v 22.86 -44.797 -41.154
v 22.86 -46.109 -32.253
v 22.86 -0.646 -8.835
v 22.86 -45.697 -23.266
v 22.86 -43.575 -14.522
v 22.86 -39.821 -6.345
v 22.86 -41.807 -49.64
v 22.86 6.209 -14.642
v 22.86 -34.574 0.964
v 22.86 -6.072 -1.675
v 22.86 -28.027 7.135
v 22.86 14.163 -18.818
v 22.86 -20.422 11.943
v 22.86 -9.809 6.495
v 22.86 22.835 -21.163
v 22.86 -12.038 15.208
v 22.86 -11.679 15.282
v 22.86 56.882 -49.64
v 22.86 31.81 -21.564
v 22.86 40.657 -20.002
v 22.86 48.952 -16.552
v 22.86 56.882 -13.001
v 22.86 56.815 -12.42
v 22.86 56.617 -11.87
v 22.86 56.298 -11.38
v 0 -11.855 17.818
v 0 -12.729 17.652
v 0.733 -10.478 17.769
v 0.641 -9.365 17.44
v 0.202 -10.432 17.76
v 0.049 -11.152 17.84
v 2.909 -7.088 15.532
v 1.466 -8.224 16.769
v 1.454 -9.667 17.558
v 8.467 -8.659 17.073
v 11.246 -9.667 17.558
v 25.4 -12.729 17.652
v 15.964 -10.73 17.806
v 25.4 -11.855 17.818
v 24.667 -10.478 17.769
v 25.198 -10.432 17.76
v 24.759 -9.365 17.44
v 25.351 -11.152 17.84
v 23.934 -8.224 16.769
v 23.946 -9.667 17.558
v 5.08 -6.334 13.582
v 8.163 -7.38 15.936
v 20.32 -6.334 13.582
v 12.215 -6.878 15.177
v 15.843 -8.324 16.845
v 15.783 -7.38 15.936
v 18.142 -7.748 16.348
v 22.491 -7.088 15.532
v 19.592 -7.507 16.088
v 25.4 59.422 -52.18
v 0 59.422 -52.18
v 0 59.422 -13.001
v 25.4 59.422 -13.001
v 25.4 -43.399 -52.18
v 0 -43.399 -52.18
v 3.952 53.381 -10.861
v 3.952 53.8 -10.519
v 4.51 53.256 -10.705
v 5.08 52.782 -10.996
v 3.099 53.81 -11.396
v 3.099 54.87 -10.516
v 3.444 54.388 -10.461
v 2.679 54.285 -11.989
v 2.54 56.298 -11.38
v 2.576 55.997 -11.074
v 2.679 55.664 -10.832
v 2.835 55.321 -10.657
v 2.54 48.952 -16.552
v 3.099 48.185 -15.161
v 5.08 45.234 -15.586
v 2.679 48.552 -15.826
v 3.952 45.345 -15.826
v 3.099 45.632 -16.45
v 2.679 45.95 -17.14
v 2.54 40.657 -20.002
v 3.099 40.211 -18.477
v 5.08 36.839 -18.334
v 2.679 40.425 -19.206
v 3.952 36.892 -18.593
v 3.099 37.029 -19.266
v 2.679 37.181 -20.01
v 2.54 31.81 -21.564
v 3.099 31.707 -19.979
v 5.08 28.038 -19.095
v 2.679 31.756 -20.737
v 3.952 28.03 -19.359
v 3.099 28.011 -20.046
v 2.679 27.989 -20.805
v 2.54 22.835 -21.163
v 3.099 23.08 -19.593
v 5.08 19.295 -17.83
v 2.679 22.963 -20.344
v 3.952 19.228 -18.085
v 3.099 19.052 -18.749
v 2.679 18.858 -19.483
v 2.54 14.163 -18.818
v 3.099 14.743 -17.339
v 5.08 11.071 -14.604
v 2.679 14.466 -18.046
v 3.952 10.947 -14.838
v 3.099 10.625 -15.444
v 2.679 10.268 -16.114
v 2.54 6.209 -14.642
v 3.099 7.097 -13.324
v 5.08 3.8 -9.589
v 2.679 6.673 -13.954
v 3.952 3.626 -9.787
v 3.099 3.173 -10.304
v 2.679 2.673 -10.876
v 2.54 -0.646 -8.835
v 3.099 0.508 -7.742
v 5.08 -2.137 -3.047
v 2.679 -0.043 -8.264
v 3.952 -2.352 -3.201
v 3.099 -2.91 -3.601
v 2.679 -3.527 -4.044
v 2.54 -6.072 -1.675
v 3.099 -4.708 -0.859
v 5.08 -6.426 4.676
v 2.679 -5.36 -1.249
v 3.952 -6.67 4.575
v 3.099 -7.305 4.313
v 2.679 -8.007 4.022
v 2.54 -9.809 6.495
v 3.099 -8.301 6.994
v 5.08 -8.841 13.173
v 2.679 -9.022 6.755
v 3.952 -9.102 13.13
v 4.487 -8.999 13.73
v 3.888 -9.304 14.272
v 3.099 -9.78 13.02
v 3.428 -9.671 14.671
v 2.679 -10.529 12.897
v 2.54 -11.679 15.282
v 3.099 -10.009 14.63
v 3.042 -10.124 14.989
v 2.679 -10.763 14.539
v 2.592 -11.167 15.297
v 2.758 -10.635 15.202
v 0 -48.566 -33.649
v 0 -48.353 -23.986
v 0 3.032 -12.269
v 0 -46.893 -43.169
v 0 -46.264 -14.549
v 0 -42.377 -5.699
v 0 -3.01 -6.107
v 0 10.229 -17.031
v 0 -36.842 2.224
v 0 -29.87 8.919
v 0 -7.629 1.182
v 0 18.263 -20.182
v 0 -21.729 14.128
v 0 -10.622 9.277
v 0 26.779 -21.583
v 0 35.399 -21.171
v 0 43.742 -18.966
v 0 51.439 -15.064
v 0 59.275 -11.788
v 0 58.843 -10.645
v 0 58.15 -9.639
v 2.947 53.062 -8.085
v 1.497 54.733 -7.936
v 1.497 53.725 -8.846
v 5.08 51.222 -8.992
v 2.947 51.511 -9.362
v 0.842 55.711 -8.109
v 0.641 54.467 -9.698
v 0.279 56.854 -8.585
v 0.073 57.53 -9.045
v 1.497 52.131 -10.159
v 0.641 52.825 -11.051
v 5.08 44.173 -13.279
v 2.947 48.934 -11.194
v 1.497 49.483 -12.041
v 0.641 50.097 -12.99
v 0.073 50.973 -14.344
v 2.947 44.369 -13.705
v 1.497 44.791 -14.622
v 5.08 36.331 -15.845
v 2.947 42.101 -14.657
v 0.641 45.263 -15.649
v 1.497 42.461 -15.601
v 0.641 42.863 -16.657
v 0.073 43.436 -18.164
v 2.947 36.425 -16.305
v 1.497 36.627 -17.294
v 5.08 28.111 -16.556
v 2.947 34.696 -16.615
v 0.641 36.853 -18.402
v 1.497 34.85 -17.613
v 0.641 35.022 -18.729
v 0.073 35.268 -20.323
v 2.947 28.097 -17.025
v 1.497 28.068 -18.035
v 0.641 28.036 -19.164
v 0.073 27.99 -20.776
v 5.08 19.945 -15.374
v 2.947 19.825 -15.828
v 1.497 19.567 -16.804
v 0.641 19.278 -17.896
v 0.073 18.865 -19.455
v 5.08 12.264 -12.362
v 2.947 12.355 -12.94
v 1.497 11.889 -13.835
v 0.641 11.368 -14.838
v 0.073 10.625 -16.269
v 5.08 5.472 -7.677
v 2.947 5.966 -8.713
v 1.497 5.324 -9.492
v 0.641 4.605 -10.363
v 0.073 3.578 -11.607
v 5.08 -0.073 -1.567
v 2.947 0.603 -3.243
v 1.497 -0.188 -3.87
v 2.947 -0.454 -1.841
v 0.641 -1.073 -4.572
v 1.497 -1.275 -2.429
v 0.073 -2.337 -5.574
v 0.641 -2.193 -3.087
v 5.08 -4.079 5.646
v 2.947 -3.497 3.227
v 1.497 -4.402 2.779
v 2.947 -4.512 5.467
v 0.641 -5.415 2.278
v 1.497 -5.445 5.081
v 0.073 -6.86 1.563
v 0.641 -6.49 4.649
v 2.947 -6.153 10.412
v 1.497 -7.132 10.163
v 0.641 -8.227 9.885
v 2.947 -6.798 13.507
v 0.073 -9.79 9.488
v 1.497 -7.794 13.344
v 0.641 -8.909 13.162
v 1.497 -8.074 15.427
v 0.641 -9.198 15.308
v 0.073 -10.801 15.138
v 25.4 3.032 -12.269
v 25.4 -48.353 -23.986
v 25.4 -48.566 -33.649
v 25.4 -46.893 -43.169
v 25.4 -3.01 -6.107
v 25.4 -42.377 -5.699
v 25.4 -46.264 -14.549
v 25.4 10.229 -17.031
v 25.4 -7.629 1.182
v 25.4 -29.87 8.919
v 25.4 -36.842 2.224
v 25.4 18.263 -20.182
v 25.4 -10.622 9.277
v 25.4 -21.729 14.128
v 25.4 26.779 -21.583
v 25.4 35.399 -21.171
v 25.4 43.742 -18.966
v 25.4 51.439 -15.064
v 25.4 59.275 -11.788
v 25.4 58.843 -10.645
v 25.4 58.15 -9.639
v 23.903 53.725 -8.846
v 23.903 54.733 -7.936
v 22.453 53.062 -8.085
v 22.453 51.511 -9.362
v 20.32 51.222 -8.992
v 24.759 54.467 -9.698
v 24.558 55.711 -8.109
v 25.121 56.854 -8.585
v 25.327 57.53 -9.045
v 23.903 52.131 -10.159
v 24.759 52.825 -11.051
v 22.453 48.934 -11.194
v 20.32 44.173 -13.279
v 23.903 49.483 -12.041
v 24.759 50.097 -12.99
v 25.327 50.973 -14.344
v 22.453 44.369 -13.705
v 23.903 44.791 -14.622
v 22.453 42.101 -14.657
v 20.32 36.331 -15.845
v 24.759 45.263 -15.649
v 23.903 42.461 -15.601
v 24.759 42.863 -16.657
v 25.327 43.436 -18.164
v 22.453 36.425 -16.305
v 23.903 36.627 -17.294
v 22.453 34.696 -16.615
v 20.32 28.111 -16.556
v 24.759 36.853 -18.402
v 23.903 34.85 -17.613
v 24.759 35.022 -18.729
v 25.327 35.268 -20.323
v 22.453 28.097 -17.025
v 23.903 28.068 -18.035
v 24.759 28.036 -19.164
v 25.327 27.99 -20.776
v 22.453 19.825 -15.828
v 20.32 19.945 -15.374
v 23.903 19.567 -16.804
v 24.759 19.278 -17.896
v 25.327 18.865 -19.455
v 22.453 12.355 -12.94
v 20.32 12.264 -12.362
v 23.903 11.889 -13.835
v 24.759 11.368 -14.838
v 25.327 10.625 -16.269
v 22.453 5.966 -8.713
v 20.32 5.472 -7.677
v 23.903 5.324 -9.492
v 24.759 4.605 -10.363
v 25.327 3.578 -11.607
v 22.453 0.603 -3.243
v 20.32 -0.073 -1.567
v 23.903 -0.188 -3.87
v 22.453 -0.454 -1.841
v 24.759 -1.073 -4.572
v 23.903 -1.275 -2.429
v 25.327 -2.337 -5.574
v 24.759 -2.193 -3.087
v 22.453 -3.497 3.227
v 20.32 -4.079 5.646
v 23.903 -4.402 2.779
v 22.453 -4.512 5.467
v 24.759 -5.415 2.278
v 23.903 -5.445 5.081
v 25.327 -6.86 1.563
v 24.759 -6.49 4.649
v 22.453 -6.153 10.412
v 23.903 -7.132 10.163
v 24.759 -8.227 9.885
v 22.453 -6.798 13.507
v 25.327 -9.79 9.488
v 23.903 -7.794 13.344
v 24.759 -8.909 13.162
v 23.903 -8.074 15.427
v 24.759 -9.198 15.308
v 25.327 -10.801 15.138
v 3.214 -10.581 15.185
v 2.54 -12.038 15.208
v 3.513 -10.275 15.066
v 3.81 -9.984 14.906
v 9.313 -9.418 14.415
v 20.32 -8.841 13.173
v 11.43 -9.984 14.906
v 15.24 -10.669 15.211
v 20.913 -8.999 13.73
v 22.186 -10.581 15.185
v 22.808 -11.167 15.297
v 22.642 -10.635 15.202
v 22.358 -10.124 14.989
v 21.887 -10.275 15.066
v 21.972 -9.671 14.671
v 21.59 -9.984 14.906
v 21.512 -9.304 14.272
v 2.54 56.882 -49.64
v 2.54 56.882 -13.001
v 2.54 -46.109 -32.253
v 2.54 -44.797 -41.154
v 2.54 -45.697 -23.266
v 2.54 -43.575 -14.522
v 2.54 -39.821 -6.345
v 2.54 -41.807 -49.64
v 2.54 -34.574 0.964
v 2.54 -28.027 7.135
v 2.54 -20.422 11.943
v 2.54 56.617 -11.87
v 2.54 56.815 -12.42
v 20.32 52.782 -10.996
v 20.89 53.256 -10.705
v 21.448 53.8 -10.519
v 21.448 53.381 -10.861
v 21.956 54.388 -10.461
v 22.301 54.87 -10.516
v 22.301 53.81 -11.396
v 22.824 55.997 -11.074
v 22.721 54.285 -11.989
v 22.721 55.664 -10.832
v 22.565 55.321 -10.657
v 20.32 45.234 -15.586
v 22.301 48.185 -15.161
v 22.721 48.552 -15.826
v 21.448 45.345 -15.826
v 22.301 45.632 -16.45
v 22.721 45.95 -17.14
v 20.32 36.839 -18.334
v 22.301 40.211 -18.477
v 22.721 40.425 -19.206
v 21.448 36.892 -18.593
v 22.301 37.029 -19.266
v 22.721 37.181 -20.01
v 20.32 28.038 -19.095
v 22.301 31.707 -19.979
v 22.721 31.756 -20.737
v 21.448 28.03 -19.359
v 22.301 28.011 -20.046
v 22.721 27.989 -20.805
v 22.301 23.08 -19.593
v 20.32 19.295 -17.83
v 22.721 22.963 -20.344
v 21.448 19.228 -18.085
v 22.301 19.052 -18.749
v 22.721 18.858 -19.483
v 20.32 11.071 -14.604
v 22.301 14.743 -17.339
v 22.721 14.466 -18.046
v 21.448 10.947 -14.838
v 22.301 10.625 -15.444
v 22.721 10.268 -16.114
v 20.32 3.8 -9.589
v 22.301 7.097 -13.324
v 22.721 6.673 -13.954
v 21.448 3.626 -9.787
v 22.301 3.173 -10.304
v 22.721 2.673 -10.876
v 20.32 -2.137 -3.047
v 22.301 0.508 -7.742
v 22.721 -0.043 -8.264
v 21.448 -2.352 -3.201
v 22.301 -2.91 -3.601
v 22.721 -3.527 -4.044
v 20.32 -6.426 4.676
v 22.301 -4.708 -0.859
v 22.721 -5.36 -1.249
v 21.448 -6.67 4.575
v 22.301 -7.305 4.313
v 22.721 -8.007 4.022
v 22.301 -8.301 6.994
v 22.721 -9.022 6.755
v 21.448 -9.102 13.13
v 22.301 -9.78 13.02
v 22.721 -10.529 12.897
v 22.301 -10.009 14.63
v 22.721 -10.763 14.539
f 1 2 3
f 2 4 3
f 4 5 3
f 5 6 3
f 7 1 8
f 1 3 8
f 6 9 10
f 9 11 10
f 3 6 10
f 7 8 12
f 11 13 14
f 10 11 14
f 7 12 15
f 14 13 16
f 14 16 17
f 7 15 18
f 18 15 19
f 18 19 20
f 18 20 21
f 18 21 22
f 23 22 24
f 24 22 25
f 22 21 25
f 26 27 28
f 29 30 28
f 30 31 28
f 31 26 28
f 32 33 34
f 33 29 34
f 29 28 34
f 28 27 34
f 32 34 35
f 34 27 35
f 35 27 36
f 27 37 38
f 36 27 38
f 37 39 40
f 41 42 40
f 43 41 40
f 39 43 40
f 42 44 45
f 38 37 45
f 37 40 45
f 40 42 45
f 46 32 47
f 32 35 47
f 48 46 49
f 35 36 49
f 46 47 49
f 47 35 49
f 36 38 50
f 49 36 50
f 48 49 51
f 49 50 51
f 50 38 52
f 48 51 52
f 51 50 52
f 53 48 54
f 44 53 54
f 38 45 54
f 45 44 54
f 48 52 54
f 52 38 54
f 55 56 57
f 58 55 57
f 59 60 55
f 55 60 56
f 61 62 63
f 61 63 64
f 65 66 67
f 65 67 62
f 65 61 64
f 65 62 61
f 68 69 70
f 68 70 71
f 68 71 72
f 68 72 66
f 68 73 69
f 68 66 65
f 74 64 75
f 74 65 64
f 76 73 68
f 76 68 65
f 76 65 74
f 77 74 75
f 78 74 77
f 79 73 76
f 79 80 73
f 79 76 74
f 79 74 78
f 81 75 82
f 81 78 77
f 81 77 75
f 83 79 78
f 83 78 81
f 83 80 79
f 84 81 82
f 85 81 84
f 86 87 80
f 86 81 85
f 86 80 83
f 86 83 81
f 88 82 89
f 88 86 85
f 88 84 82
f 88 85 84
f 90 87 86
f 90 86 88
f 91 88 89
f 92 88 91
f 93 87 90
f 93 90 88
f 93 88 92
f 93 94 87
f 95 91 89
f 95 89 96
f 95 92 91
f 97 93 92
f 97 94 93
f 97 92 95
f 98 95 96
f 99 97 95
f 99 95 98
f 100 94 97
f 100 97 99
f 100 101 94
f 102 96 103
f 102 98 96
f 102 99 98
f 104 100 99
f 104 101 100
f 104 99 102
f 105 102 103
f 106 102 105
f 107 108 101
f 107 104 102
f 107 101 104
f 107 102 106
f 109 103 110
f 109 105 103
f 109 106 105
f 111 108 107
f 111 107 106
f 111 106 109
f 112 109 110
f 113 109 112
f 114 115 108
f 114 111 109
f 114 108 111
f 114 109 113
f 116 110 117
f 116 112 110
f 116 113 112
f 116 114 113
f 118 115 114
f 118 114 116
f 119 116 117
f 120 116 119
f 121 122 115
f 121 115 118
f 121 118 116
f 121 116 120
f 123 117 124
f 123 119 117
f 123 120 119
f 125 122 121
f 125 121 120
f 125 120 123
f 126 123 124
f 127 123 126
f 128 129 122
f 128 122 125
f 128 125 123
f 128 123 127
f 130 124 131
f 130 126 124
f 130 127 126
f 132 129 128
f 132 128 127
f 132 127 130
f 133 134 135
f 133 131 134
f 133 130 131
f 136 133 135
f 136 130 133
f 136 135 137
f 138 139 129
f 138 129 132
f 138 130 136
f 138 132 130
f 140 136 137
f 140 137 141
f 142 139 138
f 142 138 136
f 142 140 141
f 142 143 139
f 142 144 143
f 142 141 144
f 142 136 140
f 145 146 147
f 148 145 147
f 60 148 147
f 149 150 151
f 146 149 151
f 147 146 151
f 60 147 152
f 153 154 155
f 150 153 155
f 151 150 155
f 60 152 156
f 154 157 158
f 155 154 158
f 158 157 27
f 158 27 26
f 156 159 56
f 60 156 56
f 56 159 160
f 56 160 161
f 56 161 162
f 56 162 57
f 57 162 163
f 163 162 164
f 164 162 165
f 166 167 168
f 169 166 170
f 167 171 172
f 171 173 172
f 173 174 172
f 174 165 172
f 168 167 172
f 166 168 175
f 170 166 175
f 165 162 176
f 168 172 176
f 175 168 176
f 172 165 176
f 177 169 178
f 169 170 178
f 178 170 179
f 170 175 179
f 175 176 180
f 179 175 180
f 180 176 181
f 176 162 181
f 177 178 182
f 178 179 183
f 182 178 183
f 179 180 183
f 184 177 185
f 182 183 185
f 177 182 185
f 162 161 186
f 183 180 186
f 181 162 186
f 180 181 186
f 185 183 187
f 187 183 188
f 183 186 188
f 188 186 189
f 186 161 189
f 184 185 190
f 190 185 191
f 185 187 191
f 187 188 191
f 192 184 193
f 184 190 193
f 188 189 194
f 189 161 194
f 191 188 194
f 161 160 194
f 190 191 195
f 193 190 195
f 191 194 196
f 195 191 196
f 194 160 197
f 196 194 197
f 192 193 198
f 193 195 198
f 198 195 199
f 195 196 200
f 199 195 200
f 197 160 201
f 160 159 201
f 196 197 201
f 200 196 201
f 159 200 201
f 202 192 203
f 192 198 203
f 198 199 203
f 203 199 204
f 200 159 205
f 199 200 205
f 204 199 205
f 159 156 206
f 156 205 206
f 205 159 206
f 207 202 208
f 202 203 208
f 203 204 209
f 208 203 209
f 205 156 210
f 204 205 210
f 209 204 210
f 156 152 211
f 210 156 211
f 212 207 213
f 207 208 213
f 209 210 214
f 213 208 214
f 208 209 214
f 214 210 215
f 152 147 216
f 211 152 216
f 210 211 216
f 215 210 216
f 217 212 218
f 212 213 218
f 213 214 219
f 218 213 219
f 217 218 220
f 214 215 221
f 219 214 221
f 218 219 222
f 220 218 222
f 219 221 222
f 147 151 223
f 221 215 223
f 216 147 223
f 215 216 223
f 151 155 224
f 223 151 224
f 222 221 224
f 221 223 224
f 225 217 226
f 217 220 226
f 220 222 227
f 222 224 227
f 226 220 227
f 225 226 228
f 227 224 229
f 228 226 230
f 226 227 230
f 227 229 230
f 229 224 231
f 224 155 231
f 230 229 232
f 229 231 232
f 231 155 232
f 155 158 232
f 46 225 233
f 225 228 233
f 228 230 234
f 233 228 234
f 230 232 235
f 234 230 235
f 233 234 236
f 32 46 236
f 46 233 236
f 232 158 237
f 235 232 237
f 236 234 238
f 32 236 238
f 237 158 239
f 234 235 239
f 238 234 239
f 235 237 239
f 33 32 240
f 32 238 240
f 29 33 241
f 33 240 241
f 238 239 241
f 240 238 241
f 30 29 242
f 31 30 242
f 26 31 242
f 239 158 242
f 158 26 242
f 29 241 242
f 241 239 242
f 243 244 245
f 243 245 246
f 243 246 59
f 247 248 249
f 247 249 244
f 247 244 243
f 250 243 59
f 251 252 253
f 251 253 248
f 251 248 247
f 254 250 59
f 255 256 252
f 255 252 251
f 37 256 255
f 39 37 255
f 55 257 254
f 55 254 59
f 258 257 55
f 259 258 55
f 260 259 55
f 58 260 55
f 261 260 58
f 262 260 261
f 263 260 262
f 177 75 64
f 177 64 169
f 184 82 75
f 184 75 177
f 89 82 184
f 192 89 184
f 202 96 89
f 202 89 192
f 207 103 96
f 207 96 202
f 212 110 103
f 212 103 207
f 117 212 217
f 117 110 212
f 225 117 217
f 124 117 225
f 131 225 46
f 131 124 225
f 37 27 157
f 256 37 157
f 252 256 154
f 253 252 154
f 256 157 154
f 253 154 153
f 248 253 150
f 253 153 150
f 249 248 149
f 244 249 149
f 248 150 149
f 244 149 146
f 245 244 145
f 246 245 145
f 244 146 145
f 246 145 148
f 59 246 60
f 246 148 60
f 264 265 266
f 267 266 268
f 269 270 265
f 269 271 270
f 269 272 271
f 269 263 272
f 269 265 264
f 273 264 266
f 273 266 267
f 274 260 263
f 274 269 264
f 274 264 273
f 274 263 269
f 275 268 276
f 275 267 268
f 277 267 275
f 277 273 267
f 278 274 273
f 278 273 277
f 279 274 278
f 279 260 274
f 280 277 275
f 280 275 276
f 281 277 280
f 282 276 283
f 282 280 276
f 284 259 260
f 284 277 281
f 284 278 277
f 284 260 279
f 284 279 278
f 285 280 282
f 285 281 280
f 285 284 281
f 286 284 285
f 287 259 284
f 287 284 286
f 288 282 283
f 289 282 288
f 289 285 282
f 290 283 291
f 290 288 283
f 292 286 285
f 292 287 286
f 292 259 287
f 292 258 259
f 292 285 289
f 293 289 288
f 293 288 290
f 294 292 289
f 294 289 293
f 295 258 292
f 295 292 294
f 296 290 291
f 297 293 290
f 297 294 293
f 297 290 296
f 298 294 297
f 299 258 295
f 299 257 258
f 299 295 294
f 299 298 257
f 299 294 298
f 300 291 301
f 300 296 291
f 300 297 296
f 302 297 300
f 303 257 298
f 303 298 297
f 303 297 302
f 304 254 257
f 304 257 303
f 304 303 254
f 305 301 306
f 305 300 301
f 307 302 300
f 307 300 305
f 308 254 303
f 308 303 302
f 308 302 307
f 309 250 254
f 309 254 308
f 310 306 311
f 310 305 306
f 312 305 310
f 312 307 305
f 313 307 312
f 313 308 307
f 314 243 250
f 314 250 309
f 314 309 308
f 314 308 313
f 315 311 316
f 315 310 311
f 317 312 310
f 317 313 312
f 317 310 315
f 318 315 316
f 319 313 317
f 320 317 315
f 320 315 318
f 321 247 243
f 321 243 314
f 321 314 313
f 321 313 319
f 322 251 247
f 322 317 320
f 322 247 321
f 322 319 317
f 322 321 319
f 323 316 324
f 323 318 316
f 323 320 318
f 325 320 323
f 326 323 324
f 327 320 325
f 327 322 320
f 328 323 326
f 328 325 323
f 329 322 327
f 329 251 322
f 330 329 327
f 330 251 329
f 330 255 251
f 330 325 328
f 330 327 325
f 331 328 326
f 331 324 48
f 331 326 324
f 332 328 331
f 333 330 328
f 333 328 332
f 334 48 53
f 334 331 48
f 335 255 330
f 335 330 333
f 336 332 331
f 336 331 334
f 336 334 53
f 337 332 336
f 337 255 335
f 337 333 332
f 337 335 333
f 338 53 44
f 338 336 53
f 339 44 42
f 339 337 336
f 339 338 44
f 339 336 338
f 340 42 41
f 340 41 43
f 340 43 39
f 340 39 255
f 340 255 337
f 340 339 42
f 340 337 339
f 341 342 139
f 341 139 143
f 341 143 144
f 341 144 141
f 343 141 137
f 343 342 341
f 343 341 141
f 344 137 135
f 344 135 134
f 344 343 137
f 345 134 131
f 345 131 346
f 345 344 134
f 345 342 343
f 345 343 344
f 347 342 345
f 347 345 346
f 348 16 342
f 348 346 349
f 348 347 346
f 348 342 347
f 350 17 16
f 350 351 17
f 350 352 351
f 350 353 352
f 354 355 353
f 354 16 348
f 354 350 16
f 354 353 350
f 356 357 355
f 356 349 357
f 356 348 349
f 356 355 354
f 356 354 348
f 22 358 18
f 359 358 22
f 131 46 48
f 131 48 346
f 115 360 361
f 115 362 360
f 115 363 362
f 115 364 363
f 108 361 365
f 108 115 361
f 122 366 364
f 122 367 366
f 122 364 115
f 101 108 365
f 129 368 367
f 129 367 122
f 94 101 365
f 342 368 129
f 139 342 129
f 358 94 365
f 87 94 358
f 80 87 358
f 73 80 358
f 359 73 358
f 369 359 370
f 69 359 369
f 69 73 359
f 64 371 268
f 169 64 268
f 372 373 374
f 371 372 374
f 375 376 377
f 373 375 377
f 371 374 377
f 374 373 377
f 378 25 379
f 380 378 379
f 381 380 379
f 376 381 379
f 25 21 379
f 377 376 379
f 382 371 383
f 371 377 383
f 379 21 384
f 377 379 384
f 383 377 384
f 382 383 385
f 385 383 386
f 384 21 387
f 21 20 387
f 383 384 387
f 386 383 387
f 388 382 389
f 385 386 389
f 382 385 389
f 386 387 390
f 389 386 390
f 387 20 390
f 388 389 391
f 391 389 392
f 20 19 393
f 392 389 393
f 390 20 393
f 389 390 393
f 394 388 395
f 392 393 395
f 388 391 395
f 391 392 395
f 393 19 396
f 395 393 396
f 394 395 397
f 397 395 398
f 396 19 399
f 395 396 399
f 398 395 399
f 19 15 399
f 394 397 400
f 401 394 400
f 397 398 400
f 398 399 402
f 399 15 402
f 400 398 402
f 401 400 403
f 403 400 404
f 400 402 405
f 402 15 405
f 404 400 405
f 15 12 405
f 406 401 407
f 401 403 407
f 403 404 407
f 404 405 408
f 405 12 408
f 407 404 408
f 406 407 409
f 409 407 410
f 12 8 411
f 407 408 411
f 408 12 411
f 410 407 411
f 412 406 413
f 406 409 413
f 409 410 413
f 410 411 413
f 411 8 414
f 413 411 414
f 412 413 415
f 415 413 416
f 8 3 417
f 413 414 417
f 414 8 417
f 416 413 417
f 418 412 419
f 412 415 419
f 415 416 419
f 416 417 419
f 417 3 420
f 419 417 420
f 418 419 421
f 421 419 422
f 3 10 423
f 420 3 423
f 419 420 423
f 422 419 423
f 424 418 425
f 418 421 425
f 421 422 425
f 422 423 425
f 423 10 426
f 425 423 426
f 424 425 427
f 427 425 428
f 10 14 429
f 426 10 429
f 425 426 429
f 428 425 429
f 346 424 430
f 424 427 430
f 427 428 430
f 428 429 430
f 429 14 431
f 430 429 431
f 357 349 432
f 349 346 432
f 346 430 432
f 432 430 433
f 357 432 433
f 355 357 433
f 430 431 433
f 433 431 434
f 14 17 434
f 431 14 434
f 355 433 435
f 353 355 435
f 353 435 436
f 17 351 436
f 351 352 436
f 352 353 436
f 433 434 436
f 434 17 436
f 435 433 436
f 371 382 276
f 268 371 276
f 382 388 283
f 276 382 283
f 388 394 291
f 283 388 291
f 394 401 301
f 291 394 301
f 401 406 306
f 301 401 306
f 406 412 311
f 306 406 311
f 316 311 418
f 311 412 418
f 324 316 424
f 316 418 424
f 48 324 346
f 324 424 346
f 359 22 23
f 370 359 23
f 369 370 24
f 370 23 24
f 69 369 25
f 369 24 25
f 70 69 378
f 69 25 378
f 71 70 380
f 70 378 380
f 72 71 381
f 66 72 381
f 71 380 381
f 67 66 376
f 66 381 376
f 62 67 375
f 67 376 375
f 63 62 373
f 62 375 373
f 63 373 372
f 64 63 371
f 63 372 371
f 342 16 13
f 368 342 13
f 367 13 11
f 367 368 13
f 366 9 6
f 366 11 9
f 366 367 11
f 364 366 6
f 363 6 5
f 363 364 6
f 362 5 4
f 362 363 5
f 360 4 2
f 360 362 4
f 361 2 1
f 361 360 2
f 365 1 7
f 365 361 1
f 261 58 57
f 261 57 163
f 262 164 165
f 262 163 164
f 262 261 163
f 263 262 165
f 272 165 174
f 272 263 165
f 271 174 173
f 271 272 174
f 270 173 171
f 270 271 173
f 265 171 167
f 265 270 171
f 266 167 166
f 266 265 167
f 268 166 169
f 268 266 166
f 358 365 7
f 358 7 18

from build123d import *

# Parameters (mm, degrees)
F1_DEPTH = 25.4
F2_R     = 5.08
F3_T     = 2.54


# Not quite as in the source:
# - a shell that OpenCascade refuses in one call is made with other operations: the cavity is built on its own and cut out


with BuildPart() as f1:
    # F0 (on Right) → F1 (new body)
    with BuildSketch(Plane.YZ):
        with BuildLine():
            ThreePointArc((-6.8017239682, 18.9395658672), (-43.2327193048, -7.2897973695), (-43.3986243496, -52.1804355085))
            Line((-43.3986243496, -52.1804355085), (59.4223327935, -52.1804355085))
            Line((59.4223327935, -52.1804355085), (59.4223327935, 0))
            ThreePointArc((59.4223327935, 0), (19.2591298188, -15.1853432617), (-6.8017239682, 18.9395658672))
        make_face()
    extrude(amount=F1_DEPTH)

    # F2
    f2_edges = [f1.edges().sort_by_distance(p)[0] for p in [
        (12.7, 59.422333, 0),
        (12.7, -6.801724, 18.939566),
        (0, 19.25913, -15.185343),
        (25.4, 19.25913, -15.185343),
    ]]
    fillet(f2_edges, radius=F2_R)

    # F3: shell of thickness 2.54, made by hand


with BuildPart() as f3_core1:
    # F3_t2: copy of F1
    add(f1.part)

    # the walls: a layer under each face that stays
    f3_faces = [f3_core1.faces().sort_by_distance(p)[0] for p in [
        (12.7, 59.4223327935, -32.5906768925),
        (0, 5.3570087404, -17.1811267303),
        (12.7, 56.5735474159, -8.4371389974),
        (12.7, 8.0118542219, -52.1804355085),
        (25.4, 5.3570087404, -17.1811267303),
        (1.4878975516, 15.4764567571, -15.4748956916),
        (12.7, -44.5374630823, -10.0289336824),
        (12.7, -8.6201931506, 17.0491329967),
        (23.9121024484, 15.4766540031, -15.4749730413),
    ]]
    thicken(f3_faces, amount=-F3_T, mode=Mode.SUBTRACT)


with BuildPart() as f1_1:
    add(f1.part)

    # what is left inside the walls is the cavity
    f3_cavity = [f3_core1.part.solids().sort_by_distance(p)[0] for p in [
        (22.8346, 5.357009, -27.999693),
    ]]
    add(f3_cavity, mode=Mode.SUBTRACT)


solid = f1_1.part
